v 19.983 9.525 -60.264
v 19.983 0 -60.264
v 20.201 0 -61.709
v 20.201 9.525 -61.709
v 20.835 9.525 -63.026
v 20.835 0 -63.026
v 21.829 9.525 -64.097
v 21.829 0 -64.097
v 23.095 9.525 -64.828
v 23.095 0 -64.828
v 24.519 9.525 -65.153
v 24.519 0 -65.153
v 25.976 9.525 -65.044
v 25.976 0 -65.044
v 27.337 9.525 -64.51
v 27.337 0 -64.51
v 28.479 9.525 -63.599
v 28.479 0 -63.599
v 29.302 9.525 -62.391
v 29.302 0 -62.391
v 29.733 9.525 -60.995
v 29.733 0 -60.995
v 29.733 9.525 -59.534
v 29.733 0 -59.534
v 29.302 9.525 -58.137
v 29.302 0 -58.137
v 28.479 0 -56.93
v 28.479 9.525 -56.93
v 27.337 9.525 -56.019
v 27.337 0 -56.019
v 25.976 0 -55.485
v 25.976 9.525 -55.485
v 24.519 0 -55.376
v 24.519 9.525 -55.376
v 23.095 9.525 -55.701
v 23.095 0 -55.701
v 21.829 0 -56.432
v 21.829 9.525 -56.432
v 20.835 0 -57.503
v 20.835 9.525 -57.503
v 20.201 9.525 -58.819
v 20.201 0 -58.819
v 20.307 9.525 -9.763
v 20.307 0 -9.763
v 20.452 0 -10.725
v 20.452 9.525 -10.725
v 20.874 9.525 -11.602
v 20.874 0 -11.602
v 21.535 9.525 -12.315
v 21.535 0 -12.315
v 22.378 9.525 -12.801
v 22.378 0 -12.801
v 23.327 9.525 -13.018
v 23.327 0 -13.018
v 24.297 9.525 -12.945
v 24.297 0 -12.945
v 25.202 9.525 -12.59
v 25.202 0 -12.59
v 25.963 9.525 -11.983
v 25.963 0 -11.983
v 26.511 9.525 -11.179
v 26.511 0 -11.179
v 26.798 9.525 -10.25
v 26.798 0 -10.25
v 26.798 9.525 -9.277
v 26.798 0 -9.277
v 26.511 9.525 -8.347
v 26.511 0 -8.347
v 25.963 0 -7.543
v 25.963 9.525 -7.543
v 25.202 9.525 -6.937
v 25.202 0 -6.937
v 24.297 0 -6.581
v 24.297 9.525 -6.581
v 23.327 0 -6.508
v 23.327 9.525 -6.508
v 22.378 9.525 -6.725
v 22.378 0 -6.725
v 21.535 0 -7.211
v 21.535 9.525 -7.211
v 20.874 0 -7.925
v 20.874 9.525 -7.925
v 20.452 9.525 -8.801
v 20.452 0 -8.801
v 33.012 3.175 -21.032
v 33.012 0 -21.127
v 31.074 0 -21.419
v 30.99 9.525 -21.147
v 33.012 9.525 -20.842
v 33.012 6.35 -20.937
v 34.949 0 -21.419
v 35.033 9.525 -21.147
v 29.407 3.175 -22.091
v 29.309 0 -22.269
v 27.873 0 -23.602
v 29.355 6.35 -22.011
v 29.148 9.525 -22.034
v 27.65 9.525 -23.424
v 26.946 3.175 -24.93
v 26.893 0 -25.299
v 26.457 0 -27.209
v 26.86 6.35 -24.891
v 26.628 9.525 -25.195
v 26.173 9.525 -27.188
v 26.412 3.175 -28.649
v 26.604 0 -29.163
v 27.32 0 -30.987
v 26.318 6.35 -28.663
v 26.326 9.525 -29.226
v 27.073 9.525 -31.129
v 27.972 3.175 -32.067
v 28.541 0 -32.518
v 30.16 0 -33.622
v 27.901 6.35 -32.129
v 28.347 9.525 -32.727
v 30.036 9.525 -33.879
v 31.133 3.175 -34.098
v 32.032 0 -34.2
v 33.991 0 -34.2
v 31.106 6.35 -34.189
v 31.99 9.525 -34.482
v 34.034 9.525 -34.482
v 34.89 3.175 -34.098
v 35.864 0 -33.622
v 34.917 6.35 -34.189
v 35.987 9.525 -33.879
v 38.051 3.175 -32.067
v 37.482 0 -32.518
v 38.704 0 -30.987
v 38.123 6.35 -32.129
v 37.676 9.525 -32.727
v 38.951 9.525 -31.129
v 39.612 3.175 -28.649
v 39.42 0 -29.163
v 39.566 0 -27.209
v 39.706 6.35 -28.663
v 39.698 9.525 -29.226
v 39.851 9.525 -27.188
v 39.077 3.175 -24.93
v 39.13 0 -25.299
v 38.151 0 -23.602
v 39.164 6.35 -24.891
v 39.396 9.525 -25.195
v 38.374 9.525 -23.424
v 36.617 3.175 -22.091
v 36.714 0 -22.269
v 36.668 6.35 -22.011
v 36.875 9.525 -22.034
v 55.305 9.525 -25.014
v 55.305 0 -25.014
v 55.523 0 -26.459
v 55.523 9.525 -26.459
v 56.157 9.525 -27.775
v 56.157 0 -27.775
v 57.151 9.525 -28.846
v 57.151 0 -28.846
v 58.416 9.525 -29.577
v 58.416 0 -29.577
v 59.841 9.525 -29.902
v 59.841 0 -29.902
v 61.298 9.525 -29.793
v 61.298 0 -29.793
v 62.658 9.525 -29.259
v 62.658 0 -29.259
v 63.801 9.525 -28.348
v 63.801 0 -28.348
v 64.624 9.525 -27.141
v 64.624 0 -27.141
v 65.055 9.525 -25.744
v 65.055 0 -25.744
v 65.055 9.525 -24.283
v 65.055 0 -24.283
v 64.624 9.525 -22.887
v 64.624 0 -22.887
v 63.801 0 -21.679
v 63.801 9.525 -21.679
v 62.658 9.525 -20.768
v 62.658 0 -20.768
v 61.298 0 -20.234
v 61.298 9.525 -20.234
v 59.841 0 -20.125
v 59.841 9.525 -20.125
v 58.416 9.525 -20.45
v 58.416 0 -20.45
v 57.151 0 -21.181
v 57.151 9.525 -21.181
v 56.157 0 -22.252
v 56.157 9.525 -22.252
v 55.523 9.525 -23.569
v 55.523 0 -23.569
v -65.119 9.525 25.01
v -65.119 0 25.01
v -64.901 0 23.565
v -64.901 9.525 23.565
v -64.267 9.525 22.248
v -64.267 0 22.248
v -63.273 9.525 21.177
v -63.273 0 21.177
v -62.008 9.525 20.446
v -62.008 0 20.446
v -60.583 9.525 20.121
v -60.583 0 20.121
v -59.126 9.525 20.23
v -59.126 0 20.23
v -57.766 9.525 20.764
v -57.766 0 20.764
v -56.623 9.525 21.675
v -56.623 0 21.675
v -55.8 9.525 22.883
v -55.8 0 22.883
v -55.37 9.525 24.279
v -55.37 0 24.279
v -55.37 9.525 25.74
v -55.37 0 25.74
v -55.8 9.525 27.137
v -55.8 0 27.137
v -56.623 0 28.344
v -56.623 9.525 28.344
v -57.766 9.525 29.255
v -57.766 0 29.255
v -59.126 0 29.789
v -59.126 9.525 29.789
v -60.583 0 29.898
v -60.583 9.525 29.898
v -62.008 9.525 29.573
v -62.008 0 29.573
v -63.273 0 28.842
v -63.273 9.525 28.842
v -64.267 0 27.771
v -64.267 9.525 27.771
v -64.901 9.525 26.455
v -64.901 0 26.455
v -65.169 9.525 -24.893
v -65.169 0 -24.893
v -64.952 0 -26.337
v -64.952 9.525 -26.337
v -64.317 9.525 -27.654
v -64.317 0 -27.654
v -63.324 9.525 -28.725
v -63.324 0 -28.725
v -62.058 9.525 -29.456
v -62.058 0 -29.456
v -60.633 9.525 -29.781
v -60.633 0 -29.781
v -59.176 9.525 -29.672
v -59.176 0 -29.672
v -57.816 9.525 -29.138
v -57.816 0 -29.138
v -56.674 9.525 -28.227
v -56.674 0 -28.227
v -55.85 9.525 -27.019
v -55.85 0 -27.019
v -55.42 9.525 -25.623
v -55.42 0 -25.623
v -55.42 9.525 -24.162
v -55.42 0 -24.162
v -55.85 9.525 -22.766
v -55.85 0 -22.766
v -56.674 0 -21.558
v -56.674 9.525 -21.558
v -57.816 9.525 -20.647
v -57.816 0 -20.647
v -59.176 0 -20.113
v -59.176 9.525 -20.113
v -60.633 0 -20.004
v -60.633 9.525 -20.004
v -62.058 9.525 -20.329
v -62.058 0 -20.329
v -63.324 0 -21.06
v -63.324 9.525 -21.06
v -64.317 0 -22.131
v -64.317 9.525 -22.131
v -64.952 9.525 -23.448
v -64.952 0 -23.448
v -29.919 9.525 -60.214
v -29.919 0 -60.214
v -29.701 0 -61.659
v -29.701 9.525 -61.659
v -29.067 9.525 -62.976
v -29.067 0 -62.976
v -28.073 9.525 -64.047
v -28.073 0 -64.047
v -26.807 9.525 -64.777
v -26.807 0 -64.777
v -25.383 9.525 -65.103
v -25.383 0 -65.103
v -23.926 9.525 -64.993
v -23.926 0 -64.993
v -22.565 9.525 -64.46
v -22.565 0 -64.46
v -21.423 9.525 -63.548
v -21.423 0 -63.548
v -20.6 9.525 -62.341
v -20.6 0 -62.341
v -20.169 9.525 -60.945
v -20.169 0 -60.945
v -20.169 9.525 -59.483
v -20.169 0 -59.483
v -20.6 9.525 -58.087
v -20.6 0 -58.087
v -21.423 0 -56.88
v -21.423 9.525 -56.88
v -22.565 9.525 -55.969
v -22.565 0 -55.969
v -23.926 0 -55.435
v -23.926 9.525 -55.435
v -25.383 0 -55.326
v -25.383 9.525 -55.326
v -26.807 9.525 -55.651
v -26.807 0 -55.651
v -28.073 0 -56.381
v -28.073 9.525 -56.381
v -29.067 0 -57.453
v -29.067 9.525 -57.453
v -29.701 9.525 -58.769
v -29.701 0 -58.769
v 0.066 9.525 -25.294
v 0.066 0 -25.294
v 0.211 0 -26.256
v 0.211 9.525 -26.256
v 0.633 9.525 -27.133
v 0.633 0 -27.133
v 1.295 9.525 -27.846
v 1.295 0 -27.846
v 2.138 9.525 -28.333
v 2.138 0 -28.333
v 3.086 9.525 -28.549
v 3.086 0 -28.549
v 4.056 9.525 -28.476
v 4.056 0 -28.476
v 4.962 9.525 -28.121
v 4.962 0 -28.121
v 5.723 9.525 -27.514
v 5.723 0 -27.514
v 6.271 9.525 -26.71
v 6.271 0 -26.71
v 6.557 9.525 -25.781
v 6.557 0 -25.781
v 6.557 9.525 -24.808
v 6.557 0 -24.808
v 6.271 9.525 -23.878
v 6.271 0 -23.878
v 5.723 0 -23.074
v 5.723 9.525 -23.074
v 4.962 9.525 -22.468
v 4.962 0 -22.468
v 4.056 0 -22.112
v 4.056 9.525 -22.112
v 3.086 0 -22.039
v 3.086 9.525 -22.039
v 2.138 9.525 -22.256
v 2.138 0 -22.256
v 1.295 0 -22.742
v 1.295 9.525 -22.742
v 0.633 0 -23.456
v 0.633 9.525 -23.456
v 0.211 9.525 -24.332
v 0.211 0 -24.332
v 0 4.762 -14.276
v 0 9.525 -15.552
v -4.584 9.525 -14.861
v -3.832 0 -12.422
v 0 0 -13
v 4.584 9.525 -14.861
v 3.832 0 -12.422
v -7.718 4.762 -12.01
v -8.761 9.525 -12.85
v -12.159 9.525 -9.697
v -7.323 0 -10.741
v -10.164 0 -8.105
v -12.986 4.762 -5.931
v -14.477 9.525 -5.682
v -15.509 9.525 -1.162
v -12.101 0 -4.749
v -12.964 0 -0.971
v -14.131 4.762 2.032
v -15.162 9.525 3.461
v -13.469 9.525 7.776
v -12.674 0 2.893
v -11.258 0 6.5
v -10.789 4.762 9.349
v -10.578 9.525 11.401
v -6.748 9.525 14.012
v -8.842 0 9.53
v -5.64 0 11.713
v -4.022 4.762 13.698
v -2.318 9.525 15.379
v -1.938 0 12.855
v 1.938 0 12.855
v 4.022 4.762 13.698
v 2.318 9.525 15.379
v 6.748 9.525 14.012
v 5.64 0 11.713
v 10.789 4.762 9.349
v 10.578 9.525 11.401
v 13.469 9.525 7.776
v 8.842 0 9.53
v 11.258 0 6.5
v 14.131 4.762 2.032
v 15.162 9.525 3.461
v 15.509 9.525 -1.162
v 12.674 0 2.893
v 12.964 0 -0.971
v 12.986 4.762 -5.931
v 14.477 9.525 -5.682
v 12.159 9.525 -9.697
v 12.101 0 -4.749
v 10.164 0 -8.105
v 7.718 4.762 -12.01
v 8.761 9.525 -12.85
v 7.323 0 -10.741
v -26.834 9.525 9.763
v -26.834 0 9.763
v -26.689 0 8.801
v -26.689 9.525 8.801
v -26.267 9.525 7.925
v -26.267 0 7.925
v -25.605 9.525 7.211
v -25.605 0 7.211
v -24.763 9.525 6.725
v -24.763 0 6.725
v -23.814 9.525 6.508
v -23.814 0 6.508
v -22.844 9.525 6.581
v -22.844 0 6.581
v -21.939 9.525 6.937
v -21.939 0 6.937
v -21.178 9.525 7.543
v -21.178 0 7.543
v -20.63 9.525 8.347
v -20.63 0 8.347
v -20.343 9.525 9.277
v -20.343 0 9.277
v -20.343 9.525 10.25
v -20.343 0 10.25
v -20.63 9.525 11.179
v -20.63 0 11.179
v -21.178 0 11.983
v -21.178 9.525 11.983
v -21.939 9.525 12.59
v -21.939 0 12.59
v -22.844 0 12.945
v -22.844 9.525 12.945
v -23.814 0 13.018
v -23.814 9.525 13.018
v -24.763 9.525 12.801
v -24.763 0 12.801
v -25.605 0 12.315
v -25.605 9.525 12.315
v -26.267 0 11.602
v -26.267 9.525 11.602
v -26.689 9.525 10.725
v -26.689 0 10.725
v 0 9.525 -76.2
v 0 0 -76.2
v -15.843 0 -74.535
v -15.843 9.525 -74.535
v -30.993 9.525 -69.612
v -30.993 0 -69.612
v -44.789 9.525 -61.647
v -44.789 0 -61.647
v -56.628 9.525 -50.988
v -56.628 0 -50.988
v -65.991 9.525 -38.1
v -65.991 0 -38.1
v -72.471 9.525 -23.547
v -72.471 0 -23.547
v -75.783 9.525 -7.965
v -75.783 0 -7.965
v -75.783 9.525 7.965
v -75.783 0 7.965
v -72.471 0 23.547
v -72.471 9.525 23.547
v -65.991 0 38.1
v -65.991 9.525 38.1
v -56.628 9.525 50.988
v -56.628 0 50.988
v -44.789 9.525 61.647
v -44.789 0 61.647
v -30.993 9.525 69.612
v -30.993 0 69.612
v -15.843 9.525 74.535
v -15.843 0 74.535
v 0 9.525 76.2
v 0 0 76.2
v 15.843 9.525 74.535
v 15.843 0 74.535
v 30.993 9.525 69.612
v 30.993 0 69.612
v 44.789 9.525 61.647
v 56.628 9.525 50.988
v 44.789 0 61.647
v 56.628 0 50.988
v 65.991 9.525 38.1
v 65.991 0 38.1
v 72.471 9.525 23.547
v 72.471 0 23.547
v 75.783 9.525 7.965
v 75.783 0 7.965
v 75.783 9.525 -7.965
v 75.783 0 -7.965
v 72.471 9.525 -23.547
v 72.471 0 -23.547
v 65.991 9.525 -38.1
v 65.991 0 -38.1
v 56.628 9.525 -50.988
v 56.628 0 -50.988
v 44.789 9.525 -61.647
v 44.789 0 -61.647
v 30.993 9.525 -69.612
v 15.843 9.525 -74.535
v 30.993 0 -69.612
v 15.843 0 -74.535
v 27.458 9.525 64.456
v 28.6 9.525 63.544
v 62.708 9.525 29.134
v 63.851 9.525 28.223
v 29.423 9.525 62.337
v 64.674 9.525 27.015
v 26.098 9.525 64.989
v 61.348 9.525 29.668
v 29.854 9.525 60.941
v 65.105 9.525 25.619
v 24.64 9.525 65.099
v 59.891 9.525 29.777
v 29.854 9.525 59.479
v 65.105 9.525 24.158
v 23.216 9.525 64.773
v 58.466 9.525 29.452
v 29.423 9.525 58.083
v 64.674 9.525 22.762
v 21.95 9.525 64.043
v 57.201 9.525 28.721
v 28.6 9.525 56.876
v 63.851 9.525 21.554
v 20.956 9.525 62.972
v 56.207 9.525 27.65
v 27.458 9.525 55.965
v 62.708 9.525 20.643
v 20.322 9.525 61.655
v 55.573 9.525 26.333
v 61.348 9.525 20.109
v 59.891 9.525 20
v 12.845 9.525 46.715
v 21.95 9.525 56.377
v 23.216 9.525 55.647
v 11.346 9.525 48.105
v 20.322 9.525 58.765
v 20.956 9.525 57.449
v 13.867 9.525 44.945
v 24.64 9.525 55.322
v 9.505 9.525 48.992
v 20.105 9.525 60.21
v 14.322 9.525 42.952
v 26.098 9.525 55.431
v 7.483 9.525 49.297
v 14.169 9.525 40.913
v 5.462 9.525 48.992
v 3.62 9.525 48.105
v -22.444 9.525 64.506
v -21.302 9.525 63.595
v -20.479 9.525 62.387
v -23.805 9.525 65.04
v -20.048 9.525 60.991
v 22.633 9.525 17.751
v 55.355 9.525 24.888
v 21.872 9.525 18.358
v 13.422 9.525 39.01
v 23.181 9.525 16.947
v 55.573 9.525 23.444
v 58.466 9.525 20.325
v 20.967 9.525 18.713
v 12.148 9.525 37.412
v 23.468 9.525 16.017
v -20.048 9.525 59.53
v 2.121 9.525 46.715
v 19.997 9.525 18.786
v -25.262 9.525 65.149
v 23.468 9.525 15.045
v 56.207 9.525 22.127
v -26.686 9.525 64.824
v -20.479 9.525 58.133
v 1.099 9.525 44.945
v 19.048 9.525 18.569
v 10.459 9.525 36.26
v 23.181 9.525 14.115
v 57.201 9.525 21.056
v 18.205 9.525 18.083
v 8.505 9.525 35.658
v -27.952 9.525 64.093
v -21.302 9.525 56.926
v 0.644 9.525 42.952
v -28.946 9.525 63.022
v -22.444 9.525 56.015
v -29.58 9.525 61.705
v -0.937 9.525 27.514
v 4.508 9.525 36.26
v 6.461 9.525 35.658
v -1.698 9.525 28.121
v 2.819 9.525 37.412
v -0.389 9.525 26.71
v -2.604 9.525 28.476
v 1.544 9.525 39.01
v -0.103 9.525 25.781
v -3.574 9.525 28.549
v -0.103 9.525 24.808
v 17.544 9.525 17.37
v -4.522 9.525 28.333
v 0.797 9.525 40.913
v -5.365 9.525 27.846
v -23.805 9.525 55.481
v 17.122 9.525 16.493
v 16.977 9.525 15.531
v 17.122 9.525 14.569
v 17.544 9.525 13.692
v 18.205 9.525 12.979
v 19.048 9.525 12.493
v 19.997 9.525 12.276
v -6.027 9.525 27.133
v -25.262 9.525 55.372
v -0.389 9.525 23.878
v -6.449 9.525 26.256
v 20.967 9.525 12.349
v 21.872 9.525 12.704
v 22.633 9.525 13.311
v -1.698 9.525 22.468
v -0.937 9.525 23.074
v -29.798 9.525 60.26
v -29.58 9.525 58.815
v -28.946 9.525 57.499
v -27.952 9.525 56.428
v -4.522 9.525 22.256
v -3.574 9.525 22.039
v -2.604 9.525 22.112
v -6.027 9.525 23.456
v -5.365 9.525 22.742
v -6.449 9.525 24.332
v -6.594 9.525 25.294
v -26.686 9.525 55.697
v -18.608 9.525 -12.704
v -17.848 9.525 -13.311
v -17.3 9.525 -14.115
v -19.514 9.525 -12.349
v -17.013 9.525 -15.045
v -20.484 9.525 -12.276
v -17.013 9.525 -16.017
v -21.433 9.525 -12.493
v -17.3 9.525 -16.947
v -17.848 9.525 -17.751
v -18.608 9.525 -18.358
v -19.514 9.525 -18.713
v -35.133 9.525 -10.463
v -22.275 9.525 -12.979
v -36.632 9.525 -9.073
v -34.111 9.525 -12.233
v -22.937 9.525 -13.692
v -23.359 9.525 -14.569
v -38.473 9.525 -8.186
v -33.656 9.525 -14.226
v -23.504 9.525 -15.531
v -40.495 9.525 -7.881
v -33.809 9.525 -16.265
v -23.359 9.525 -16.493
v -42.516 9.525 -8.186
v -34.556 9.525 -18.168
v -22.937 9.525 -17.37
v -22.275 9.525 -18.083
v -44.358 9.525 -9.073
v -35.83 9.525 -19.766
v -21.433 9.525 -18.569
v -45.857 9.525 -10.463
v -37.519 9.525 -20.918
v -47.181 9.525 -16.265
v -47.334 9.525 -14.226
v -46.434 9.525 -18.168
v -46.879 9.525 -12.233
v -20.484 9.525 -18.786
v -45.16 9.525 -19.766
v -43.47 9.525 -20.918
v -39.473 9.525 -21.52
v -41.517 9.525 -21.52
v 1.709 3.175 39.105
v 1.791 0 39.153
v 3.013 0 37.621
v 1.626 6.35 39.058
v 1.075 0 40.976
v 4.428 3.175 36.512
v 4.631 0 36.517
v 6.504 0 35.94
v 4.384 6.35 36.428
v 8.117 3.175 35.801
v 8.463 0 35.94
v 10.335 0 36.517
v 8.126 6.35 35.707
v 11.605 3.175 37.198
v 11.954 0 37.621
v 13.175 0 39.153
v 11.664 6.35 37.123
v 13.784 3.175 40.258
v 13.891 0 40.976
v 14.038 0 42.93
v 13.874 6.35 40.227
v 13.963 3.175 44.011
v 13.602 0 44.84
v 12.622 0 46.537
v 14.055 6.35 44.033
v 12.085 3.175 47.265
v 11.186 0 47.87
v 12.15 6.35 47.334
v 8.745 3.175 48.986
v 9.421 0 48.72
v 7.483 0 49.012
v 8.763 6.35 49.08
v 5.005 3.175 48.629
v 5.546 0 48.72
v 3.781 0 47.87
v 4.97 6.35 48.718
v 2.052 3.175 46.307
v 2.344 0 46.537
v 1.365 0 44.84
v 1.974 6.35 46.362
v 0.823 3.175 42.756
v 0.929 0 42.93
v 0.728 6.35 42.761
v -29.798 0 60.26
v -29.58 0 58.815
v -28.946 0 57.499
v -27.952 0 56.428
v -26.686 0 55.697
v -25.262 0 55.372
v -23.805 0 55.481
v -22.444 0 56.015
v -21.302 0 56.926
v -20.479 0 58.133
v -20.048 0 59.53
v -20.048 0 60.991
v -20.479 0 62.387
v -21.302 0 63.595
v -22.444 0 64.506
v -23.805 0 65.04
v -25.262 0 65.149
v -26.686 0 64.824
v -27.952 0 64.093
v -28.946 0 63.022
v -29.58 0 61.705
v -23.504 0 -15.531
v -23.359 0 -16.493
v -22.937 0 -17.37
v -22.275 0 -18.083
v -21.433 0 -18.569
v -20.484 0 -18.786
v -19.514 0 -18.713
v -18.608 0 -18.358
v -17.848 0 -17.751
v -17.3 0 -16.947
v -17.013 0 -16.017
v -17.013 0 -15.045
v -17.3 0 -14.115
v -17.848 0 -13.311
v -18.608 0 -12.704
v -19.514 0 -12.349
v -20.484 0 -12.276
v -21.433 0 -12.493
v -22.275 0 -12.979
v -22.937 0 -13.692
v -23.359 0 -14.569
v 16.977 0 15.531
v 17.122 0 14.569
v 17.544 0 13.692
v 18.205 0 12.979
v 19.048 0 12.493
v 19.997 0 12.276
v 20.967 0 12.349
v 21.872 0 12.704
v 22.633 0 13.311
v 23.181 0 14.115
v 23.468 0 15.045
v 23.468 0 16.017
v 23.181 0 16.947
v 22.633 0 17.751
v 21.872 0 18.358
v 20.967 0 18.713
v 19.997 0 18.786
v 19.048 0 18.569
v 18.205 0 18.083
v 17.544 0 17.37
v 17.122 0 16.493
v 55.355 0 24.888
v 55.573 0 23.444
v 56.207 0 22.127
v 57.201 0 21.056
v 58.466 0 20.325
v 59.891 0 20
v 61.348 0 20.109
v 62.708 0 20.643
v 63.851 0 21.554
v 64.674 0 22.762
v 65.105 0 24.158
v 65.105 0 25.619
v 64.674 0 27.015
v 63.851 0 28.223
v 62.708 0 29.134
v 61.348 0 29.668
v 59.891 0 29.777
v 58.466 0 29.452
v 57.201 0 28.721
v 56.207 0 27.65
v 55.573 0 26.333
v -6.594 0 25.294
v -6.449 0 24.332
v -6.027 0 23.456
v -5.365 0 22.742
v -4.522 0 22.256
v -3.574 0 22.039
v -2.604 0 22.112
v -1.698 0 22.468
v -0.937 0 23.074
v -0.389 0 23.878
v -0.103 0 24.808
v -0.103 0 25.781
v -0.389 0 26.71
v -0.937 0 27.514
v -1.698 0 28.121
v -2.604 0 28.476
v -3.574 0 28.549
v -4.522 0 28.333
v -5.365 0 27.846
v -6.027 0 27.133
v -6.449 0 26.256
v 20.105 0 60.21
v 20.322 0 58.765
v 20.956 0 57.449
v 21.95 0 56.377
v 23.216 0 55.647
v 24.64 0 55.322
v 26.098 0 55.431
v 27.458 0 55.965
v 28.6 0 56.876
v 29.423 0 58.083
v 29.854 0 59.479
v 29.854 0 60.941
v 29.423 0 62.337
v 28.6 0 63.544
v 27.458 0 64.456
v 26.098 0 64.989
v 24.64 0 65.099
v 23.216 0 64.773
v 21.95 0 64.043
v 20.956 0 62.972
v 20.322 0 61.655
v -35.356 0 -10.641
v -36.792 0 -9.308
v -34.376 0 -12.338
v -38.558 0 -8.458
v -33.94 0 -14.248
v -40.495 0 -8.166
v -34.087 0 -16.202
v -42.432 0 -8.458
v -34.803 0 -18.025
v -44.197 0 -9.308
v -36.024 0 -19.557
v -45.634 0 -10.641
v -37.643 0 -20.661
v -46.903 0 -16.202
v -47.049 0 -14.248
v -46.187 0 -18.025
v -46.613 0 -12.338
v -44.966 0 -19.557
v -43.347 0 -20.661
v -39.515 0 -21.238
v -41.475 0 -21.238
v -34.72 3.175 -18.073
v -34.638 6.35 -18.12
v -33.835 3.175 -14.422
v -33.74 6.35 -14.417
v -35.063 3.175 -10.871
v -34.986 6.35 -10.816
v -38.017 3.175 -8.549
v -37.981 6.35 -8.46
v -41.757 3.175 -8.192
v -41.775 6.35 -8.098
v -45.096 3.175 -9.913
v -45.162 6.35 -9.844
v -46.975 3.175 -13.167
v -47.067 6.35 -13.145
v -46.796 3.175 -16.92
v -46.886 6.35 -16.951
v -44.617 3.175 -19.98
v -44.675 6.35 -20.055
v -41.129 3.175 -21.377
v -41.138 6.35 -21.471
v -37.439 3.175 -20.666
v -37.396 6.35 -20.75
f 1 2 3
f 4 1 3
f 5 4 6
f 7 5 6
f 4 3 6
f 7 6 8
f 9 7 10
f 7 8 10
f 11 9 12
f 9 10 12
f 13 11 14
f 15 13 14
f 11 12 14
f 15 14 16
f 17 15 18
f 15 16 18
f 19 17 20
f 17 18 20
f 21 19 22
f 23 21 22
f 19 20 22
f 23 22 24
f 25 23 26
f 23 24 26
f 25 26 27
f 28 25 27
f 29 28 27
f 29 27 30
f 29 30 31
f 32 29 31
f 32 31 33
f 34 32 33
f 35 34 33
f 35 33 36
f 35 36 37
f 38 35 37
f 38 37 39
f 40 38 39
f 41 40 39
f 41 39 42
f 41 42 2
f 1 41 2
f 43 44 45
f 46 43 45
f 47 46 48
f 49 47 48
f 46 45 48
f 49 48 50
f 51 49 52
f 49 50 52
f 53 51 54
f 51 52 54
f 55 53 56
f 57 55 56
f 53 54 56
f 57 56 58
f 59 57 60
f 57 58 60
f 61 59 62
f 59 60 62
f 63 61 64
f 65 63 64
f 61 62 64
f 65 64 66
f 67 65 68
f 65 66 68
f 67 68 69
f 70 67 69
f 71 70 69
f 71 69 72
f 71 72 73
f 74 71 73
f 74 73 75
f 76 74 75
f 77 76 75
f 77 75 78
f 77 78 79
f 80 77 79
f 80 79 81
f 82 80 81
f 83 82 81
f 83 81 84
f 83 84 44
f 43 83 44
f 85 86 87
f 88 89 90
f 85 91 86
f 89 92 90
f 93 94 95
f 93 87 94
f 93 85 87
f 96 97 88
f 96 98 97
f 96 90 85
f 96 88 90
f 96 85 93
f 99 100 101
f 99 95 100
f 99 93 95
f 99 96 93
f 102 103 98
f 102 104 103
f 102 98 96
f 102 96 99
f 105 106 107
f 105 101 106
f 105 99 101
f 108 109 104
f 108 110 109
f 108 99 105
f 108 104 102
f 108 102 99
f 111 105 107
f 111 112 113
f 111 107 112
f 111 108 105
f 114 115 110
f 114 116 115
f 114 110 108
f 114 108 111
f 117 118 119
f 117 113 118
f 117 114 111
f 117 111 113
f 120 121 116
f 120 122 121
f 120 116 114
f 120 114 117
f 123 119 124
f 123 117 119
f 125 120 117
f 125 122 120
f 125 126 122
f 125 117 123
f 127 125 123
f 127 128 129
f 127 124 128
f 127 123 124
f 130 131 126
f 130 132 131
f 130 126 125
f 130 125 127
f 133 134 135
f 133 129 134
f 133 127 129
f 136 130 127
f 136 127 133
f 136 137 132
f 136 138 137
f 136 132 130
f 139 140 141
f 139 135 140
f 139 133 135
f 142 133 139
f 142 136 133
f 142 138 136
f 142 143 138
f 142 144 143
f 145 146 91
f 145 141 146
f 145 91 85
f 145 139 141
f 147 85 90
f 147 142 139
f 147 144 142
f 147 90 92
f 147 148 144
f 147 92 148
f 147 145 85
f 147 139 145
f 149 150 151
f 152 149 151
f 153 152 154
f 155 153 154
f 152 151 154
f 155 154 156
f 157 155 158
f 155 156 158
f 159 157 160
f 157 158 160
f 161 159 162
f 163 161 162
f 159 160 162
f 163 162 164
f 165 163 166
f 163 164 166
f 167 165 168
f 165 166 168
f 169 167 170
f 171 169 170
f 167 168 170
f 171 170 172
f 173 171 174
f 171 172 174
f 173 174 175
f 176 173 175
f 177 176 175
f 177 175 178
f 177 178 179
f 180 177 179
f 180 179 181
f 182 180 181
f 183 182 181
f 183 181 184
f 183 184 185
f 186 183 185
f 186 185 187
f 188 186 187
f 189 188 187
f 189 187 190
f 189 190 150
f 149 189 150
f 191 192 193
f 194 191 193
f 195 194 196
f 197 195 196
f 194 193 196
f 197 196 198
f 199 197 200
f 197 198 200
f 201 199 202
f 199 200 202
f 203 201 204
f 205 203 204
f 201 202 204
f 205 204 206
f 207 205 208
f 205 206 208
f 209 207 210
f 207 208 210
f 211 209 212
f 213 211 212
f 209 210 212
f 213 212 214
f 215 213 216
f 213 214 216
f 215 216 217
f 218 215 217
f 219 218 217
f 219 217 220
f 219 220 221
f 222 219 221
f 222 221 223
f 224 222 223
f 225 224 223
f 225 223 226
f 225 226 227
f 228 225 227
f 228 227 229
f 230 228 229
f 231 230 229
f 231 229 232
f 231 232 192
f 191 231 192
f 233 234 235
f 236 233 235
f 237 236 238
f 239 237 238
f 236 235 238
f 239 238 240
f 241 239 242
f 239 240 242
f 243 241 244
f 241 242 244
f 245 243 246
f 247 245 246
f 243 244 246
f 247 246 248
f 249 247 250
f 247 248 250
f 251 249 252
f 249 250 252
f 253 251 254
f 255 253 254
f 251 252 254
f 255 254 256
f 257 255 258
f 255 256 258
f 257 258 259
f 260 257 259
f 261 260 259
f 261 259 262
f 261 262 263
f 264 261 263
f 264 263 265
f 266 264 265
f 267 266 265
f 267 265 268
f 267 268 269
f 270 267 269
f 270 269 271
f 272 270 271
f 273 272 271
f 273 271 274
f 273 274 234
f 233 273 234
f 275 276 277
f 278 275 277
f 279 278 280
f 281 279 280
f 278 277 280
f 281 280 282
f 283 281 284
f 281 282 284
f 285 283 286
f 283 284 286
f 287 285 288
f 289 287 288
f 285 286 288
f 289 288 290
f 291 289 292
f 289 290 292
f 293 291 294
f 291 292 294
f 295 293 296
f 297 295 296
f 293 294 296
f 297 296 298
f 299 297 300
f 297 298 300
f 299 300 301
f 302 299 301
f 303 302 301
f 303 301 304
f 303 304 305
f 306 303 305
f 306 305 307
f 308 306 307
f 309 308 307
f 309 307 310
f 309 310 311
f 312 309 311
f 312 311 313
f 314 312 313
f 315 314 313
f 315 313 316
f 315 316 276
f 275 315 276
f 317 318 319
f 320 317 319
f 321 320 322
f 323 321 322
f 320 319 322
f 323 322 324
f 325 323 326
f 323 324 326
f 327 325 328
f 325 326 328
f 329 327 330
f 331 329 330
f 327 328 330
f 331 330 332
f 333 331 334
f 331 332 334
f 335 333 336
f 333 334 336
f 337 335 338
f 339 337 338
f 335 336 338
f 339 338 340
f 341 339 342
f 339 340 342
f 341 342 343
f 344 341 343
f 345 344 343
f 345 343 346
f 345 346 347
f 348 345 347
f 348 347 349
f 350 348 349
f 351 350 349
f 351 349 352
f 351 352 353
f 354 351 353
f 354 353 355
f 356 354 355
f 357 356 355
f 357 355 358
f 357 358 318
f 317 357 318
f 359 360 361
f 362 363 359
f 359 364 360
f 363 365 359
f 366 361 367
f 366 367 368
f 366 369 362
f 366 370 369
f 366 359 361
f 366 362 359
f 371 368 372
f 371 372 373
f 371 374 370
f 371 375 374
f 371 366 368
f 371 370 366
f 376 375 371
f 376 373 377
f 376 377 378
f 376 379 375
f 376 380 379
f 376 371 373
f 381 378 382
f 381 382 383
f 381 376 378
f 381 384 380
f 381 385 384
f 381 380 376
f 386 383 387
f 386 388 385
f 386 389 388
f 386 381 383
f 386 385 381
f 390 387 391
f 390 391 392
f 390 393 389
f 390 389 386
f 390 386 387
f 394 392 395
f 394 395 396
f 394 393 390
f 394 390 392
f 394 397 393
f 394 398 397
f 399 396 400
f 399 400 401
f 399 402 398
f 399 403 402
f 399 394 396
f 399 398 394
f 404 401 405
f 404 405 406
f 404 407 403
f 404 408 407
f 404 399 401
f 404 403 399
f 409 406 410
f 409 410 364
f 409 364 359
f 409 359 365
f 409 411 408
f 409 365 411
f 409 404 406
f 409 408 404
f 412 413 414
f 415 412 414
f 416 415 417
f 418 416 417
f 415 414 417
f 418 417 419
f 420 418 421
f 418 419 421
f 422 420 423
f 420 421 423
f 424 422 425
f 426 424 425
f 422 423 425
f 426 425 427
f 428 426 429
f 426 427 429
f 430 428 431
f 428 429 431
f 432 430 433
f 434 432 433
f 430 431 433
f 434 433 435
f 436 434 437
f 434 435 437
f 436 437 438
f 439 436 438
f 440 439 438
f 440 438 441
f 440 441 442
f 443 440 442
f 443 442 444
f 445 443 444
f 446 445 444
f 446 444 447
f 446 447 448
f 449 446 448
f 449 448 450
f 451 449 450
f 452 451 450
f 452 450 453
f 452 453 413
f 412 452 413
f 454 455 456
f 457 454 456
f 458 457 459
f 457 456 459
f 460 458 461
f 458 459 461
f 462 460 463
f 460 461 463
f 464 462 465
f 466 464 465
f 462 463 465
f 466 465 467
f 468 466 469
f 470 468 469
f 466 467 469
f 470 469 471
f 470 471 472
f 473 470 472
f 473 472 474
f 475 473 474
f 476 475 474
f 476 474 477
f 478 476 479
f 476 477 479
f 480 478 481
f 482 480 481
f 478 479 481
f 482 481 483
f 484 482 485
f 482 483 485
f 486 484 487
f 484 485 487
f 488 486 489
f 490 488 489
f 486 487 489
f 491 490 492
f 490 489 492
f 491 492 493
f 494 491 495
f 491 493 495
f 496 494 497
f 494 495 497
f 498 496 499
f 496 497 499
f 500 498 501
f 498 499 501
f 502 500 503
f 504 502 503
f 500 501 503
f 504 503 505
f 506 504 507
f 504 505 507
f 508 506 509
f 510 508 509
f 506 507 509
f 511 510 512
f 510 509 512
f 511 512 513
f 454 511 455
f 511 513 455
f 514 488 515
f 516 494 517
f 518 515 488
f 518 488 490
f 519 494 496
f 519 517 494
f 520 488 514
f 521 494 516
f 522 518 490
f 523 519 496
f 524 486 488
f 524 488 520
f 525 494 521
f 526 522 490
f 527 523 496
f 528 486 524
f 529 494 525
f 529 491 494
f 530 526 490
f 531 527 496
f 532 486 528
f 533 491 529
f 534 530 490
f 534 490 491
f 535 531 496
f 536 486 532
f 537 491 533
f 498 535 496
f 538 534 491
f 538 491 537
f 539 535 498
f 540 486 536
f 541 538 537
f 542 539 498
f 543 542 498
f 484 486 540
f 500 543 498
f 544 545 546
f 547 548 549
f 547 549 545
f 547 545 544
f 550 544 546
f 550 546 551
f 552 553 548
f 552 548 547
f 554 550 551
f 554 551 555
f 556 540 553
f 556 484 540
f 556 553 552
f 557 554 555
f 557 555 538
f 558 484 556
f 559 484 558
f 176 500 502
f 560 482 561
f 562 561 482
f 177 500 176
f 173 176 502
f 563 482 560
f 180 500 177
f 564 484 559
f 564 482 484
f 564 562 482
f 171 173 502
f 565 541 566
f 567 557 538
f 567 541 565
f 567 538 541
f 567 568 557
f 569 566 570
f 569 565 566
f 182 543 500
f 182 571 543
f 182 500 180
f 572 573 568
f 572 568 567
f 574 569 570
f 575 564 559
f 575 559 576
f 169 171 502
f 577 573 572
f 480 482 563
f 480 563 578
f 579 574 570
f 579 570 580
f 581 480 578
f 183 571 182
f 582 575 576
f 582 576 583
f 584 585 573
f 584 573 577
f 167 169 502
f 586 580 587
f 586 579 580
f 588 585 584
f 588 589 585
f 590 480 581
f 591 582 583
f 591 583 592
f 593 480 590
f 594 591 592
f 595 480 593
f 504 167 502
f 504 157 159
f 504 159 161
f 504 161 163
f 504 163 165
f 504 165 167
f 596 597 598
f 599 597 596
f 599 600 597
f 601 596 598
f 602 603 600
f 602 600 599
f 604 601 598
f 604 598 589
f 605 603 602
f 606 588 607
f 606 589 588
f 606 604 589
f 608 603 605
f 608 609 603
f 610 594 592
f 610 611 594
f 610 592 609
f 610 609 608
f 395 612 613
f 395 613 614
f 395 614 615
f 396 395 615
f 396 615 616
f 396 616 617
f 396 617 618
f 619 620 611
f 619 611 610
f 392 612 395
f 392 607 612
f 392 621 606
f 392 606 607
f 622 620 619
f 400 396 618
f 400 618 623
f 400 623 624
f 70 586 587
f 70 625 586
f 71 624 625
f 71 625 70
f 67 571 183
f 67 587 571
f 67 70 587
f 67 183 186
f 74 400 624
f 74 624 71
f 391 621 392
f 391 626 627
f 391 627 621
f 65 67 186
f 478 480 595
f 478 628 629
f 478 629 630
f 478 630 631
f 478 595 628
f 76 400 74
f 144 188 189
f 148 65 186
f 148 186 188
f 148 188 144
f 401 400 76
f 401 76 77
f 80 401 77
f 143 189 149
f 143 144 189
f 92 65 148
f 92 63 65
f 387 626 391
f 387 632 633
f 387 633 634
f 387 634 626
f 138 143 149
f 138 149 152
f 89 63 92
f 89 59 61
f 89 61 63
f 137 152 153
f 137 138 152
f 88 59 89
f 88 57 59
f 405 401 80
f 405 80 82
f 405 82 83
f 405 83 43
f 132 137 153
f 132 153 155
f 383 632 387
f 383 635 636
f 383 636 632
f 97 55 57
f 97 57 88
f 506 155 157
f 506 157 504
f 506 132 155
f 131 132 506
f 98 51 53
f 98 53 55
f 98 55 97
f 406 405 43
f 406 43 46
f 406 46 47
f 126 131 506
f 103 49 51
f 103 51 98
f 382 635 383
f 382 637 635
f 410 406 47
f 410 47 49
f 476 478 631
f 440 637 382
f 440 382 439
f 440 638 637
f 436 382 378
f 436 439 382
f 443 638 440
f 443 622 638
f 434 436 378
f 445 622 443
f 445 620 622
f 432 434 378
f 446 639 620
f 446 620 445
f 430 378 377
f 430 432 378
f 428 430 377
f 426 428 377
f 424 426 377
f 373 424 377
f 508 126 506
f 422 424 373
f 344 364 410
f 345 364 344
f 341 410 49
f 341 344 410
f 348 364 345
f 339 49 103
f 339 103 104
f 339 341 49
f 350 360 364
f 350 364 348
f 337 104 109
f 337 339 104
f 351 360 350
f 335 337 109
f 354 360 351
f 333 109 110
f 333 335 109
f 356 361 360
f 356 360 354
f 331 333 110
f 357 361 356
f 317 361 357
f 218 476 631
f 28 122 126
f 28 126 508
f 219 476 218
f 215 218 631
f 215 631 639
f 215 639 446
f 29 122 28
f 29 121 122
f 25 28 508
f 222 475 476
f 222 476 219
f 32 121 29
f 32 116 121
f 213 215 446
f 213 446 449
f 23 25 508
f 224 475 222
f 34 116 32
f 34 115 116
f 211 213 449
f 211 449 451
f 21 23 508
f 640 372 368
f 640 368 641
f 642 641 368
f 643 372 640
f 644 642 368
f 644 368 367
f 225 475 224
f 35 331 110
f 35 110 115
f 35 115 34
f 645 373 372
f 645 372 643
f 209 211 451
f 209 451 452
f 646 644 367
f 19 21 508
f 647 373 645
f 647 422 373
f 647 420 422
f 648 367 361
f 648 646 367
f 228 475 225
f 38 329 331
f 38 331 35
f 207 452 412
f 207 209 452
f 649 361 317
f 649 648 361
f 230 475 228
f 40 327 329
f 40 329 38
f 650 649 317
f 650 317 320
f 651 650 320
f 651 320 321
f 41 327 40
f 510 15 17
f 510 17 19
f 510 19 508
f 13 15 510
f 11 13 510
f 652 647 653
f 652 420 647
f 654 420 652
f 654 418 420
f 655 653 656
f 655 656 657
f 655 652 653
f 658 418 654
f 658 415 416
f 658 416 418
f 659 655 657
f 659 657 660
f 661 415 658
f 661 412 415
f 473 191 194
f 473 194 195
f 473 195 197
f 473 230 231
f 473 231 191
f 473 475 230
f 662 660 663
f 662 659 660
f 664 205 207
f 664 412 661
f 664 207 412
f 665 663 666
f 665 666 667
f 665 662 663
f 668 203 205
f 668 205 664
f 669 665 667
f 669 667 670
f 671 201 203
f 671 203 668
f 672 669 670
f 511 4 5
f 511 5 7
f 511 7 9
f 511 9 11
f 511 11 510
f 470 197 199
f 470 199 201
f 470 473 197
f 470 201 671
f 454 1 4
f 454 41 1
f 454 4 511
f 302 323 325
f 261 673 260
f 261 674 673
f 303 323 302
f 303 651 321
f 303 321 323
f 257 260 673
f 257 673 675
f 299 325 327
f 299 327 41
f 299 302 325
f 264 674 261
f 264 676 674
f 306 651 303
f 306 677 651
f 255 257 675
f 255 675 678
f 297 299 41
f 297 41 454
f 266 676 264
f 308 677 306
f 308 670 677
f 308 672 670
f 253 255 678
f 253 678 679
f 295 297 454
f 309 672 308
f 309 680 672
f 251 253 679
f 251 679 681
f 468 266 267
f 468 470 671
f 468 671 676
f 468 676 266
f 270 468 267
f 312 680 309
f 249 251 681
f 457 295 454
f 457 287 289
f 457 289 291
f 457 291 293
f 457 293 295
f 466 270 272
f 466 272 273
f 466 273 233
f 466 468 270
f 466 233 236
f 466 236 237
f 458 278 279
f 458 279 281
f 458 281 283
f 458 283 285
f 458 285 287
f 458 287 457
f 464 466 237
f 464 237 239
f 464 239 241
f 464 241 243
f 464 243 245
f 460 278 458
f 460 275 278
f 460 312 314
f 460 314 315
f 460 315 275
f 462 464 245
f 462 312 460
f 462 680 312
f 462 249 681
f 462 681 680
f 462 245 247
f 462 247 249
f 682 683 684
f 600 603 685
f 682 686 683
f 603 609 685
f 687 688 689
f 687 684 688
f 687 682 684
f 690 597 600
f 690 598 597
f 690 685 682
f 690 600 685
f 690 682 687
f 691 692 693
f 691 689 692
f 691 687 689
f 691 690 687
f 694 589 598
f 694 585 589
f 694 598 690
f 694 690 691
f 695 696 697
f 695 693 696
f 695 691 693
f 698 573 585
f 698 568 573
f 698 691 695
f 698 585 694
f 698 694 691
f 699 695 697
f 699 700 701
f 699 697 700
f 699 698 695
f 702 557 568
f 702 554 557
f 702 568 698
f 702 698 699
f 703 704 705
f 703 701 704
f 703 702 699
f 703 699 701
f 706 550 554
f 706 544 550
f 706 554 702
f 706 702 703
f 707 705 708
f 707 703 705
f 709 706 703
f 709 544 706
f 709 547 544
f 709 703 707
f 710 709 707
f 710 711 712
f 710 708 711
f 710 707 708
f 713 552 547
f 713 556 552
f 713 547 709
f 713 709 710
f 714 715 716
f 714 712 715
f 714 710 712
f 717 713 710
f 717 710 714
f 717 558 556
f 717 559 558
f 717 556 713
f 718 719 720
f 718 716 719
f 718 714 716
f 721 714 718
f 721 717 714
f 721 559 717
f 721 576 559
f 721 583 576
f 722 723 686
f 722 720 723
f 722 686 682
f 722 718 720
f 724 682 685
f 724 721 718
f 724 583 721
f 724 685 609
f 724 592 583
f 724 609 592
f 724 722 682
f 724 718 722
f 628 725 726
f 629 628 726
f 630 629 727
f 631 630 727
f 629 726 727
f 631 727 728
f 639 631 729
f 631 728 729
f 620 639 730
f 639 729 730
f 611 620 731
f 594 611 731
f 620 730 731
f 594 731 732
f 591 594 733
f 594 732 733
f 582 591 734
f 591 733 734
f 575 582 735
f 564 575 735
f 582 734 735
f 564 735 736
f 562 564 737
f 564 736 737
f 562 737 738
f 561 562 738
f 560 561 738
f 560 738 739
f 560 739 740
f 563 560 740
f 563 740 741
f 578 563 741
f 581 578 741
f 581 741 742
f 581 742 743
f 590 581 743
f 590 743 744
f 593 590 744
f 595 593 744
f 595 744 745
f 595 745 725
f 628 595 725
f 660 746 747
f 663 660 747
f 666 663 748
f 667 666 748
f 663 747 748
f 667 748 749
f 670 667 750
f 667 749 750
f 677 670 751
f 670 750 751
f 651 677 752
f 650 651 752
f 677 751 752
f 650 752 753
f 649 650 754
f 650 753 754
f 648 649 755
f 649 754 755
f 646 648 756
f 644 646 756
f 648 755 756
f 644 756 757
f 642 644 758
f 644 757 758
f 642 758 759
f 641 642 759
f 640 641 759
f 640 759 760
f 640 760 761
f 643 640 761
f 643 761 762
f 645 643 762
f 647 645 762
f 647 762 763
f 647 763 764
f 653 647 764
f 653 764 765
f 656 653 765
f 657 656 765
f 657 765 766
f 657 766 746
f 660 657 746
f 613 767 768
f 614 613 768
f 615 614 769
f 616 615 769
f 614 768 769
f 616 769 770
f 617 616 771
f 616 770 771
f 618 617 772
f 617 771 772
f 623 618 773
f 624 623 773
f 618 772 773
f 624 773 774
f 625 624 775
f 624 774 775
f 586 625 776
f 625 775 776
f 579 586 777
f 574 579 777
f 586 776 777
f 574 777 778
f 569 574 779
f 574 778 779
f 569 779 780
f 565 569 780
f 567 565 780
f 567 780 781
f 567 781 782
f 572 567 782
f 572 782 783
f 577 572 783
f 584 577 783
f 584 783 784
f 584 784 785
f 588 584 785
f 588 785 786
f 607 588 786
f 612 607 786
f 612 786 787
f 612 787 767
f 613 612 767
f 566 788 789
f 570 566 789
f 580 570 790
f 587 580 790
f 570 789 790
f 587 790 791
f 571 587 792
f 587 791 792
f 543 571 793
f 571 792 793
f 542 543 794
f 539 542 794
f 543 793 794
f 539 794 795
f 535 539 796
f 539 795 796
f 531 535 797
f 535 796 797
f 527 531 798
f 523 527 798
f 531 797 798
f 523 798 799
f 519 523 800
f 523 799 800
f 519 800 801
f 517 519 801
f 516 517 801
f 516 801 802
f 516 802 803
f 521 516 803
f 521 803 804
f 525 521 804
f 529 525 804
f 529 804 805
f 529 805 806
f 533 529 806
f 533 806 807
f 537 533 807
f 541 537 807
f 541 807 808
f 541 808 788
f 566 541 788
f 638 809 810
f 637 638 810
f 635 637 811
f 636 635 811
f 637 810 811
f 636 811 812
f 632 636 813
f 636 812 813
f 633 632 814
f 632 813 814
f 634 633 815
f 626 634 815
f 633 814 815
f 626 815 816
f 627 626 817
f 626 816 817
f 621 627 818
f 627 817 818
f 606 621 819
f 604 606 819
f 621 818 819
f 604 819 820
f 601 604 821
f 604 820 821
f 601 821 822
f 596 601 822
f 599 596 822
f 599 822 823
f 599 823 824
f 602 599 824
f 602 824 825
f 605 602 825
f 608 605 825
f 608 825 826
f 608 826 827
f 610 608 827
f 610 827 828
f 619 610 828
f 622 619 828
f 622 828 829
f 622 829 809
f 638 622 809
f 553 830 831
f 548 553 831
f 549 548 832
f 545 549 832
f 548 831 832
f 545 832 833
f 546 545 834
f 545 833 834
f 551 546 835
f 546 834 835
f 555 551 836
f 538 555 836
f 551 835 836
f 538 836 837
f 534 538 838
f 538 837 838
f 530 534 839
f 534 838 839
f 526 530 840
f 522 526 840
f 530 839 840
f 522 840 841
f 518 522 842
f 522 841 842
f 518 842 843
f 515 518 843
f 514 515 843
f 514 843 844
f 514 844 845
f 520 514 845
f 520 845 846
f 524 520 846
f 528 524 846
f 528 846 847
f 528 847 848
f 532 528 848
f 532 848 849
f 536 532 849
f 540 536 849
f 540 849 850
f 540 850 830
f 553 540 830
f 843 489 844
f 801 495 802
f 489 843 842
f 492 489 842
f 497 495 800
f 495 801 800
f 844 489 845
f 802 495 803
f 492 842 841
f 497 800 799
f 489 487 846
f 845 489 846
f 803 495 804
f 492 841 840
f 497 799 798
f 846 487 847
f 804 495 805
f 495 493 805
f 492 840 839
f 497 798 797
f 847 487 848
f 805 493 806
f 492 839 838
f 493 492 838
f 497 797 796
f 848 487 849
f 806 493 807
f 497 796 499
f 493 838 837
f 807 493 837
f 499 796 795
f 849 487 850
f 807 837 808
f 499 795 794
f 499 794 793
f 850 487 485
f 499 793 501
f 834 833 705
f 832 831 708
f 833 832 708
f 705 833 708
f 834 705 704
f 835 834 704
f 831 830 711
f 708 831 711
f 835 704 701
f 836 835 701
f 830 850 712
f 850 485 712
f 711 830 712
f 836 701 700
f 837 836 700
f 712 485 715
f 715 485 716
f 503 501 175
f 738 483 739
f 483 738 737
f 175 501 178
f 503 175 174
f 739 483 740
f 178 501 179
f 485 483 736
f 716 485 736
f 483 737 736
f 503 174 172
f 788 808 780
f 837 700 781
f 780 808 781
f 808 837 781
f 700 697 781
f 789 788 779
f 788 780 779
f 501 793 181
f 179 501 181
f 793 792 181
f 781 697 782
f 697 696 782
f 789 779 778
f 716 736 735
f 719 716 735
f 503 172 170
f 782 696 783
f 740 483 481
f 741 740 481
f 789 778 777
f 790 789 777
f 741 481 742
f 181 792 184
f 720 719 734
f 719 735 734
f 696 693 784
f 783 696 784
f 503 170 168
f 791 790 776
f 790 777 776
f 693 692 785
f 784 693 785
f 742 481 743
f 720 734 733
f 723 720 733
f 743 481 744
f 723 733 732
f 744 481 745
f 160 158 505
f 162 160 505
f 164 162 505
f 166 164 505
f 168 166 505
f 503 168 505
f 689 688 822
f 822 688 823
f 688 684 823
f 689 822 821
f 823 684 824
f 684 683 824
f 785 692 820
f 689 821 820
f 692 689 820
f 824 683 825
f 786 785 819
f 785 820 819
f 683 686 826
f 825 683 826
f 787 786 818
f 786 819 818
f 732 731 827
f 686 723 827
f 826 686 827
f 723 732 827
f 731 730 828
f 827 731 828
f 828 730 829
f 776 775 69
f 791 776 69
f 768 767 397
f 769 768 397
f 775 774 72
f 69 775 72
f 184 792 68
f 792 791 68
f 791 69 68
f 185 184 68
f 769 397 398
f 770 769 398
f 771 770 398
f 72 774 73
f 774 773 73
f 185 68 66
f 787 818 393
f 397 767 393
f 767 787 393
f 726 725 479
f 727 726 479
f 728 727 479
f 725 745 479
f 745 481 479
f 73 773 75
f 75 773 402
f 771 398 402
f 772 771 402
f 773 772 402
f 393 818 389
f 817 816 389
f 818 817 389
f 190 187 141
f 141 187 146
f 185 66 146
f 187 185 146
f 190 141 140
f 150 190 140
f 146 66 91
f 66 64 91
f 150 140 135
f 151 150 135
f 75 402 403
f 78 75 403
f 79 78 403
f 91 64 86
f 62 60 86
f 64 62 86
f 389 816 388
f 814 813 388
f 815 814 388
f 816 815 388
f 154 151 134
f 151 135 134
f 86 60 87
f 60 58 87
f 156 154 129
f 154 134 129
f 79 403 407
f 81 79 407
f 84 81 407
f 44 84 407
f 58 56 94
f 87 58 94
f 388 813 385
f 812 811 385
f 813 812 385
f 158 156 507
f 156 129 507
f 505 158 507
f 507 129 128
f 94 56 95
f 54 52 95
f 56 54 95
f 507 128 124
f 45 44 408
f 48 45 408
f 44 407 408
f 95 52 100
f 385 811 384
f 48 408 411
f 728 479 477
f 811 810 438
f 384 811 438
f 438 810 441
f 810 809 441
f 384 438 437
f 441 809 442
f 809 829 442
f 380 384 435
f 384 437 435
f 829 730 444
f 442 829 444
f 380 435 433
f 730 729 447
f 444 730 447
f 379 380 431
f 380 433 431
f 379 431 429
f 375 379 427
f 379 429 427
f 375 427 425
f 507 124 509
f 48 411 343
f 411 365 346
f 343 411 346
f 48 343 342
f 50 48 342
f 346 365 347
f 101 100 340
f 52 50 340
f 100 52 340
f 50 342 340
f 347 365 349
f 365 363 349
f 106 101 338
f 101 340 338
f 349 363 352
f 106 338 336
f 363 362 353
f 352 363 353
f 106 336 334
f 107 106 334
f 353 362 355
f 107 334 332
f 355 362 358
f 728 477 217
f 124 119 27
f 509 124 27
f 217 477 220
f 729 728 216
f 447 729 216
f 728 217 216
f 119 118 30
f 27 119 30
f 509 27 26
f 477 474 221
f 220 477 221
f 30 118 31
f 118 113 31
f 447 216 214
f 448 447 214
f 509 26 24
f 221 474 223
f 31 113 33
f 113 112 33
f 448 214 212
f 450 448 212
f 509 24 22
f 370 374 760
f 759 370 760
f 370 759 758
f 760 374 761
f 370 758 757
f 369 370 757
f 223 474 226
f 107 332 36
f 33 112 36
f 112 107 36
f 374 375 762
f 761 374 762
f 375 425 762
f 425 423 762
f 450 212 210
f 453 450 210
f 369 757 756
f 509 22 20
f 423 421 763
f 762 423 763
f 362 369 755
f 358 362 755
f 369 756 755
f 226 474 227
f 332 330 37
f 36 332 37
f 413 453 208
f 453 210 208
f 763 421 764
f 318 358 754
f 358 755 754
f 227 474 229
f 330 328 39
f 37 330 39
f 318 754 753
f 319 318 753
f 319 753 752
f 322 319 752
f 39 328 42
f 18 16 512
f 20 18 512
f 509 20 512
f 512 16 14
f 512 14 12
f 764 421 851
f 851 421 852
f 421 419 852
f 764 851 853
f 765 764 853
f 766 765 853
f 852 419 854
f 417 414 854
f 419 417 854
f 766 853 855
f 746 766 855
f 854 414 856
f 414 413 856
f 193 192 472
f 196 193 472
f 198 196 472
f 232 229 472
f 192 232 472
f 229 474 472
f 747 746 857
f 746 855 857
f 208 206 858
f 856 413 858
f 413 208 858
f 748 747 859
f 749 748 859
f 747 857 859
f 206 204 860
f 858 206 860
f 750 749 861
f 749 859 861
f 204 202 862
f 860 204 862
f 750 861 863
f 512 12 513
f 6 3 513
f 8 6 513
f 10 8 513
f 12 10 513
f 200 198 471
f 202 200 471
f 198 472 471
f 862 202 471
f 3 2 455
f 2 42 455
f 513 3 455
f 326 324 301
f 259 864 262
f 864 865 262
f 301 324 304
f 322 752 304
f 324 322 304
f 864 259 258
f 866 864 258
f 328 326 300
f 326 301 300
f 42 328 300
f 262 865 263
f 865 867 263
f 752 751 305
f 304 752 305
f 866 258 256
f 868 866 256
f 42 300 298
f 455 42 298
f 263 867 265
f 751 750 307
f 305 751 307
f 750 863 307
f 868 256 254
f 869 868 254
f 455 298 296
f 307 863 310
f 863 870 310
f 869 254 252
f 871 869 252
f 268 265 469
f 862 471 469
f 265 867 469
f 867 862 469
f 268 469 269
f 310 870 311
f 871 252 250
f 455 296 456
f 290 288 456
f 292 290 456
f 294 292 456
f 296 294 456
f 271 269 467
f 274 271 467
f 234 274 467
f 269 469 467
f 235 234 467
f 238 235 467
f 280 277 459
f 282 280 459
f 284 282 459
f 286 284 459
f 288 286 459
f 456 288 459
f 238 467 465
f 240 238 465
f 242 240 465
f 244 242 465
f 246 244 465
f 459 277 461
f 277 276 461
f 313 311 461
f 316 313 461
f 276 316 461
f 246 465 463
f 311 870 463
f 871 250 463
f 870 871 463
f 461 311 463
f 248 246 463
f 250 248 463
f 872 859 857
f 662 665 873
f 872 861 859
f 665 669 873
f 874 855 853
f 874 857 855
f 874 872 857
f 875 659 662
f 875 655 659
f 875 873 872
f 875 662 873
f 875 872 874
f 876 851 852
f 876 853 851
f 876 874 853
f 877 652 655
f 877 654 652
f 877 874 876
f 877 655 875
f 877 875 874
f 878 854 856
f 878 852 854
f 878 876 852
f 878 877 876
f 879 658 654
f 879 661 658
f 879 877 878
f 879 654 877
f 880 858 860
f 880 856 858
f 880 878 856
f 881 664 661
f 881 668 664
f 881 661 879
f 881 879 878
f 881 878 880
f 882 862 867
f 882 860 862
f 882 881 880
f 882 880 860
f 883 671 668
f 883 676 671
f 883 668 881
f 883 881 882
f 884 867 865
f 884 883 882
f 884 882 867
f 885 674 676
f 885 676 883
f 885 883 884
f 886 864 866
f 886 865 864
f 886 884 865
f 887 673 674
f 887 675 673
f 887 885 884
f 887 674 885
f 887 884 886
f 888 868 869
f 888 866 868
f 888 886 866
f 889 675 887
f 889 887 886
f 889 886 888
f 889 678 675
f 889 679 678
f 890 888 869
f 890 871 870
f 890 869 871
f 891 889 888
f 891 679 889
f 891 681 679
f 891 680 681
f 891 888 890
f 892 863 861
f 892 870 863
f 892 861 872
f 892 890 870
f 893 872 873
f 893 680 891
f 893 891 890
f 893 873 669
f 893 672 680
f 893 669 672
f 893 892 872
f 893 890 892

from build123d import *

# Parameters (mm, degrees)
SKETCH1_R               = 76.2
BOSS_EXTRUDE1_DEPTH     = 9.525
CIRPATTERN6_COUNT       = 3
F_3_8_CLEARANCE_HOLE1_D = 9.8044
F_1_4_CLEARANCE_HOLE1_D = 6.5278


with BuildPart() as part:
    # Sketch1 → Boss-Extrude1 (new body)
    with BuildSketch(Plane(origin=(0, 0, 0), x_dir=(1, 0, 0), z_dir=(0, 1, 0))):
        with Locations(Location((0, 0, 0), (0, 0, 90))):
            Circle(SKETCH1_R)
    extrude(amount=BOSS_EXTRUDE1_DEPTH)

    # Sketch5 → Cut-Revolve1 (revolve, cut)
    with BuildSketch(Plane.XY, mode=Mode.PRIVATE) as cut_revolve1_sk:
        Polygon((0, 0), (0, 9.525), (15.552216058, 9.525), (13, 0), align=None)
    revolve(cut_revolve1_sk.sketch.rotate(Axis((0, 0, 0), (0, 1, 0)), 90), axis=Axis((0, 0, 0), (0, 1, 0)), mode=Mode.SUBTRACT)

    # Sketch15 → 1/4 NPT Tapped Hole1 (revolve, cut)
    with BuildSketch(Plane(origin=(33.011727721, 9.525, -27.700128555), x_dir=(0, 0, 1), z_dir=(1, 0, 0))):
        Polygon((0, 0), (0, 9.525), (5.5626, 9.525), (5.5626, 10.0203), (6.557978799, 10.0203), (6.858, 0), align=None)
    f_1_4_npt_tapped_hole1 = revolve(axis=Axis((33.011727721, 15.875, -27.700128555), (0, -1, 0)), mode=Mode.SUBTRACT)

    # CirPattern6: 1/4 NPT Tapped Hole1 ×3 about axis
    cirpattern6_axis = Axis((0, 0, 0), (0, 1, 0))
    for i in range(1, CIRPATTERN6_COUNT):
        add(f_1_4_npt_tapped_hole1.rotate(cirpattern6_axis, i * 360 / CIRPATTERN6_COUNT), mode=Mode.SUBTRACT)

    # 3/8 Clearance Hole1 (through all)
    with Locations(Plane(origin=(0, 9.525, 0), x_dir=(1, 0, 0), z_dir=(0, 1, 0))):
        with Locations((60.207217661, 25.013604371), (60.257374801, -24.888494705), (24.885638551, 60.264250563), (-25.016460514, 60.214093421), (-60.267106699, 24.892514335), (-60.216949569, -25.009584719), (-24.895370482, -60.260230921), (25.006728592, -60.210073801)):
            Hole(F_3_8_CLEARANCE_HOLE1_D / 2)

    # 1/4 Clearance Hole1 (through all)
    with Locations(Plane(origin=(0, 9.525, 0), x_dir=(1, 0, 0), z_dir=(0, 1, 0))):
        with Locations((3.330049479, 25.294237026), (-20.240427094, 15.531025958), (20.240427094, -15.531025958), (-23.570476573, -9.763211068), (-3.330049479, -25.294237026), (23.570476573, 9.763211068)):
            Hole(F_1_4_CLEARANCE_HOLE1_D / 2)


solid = part.part
